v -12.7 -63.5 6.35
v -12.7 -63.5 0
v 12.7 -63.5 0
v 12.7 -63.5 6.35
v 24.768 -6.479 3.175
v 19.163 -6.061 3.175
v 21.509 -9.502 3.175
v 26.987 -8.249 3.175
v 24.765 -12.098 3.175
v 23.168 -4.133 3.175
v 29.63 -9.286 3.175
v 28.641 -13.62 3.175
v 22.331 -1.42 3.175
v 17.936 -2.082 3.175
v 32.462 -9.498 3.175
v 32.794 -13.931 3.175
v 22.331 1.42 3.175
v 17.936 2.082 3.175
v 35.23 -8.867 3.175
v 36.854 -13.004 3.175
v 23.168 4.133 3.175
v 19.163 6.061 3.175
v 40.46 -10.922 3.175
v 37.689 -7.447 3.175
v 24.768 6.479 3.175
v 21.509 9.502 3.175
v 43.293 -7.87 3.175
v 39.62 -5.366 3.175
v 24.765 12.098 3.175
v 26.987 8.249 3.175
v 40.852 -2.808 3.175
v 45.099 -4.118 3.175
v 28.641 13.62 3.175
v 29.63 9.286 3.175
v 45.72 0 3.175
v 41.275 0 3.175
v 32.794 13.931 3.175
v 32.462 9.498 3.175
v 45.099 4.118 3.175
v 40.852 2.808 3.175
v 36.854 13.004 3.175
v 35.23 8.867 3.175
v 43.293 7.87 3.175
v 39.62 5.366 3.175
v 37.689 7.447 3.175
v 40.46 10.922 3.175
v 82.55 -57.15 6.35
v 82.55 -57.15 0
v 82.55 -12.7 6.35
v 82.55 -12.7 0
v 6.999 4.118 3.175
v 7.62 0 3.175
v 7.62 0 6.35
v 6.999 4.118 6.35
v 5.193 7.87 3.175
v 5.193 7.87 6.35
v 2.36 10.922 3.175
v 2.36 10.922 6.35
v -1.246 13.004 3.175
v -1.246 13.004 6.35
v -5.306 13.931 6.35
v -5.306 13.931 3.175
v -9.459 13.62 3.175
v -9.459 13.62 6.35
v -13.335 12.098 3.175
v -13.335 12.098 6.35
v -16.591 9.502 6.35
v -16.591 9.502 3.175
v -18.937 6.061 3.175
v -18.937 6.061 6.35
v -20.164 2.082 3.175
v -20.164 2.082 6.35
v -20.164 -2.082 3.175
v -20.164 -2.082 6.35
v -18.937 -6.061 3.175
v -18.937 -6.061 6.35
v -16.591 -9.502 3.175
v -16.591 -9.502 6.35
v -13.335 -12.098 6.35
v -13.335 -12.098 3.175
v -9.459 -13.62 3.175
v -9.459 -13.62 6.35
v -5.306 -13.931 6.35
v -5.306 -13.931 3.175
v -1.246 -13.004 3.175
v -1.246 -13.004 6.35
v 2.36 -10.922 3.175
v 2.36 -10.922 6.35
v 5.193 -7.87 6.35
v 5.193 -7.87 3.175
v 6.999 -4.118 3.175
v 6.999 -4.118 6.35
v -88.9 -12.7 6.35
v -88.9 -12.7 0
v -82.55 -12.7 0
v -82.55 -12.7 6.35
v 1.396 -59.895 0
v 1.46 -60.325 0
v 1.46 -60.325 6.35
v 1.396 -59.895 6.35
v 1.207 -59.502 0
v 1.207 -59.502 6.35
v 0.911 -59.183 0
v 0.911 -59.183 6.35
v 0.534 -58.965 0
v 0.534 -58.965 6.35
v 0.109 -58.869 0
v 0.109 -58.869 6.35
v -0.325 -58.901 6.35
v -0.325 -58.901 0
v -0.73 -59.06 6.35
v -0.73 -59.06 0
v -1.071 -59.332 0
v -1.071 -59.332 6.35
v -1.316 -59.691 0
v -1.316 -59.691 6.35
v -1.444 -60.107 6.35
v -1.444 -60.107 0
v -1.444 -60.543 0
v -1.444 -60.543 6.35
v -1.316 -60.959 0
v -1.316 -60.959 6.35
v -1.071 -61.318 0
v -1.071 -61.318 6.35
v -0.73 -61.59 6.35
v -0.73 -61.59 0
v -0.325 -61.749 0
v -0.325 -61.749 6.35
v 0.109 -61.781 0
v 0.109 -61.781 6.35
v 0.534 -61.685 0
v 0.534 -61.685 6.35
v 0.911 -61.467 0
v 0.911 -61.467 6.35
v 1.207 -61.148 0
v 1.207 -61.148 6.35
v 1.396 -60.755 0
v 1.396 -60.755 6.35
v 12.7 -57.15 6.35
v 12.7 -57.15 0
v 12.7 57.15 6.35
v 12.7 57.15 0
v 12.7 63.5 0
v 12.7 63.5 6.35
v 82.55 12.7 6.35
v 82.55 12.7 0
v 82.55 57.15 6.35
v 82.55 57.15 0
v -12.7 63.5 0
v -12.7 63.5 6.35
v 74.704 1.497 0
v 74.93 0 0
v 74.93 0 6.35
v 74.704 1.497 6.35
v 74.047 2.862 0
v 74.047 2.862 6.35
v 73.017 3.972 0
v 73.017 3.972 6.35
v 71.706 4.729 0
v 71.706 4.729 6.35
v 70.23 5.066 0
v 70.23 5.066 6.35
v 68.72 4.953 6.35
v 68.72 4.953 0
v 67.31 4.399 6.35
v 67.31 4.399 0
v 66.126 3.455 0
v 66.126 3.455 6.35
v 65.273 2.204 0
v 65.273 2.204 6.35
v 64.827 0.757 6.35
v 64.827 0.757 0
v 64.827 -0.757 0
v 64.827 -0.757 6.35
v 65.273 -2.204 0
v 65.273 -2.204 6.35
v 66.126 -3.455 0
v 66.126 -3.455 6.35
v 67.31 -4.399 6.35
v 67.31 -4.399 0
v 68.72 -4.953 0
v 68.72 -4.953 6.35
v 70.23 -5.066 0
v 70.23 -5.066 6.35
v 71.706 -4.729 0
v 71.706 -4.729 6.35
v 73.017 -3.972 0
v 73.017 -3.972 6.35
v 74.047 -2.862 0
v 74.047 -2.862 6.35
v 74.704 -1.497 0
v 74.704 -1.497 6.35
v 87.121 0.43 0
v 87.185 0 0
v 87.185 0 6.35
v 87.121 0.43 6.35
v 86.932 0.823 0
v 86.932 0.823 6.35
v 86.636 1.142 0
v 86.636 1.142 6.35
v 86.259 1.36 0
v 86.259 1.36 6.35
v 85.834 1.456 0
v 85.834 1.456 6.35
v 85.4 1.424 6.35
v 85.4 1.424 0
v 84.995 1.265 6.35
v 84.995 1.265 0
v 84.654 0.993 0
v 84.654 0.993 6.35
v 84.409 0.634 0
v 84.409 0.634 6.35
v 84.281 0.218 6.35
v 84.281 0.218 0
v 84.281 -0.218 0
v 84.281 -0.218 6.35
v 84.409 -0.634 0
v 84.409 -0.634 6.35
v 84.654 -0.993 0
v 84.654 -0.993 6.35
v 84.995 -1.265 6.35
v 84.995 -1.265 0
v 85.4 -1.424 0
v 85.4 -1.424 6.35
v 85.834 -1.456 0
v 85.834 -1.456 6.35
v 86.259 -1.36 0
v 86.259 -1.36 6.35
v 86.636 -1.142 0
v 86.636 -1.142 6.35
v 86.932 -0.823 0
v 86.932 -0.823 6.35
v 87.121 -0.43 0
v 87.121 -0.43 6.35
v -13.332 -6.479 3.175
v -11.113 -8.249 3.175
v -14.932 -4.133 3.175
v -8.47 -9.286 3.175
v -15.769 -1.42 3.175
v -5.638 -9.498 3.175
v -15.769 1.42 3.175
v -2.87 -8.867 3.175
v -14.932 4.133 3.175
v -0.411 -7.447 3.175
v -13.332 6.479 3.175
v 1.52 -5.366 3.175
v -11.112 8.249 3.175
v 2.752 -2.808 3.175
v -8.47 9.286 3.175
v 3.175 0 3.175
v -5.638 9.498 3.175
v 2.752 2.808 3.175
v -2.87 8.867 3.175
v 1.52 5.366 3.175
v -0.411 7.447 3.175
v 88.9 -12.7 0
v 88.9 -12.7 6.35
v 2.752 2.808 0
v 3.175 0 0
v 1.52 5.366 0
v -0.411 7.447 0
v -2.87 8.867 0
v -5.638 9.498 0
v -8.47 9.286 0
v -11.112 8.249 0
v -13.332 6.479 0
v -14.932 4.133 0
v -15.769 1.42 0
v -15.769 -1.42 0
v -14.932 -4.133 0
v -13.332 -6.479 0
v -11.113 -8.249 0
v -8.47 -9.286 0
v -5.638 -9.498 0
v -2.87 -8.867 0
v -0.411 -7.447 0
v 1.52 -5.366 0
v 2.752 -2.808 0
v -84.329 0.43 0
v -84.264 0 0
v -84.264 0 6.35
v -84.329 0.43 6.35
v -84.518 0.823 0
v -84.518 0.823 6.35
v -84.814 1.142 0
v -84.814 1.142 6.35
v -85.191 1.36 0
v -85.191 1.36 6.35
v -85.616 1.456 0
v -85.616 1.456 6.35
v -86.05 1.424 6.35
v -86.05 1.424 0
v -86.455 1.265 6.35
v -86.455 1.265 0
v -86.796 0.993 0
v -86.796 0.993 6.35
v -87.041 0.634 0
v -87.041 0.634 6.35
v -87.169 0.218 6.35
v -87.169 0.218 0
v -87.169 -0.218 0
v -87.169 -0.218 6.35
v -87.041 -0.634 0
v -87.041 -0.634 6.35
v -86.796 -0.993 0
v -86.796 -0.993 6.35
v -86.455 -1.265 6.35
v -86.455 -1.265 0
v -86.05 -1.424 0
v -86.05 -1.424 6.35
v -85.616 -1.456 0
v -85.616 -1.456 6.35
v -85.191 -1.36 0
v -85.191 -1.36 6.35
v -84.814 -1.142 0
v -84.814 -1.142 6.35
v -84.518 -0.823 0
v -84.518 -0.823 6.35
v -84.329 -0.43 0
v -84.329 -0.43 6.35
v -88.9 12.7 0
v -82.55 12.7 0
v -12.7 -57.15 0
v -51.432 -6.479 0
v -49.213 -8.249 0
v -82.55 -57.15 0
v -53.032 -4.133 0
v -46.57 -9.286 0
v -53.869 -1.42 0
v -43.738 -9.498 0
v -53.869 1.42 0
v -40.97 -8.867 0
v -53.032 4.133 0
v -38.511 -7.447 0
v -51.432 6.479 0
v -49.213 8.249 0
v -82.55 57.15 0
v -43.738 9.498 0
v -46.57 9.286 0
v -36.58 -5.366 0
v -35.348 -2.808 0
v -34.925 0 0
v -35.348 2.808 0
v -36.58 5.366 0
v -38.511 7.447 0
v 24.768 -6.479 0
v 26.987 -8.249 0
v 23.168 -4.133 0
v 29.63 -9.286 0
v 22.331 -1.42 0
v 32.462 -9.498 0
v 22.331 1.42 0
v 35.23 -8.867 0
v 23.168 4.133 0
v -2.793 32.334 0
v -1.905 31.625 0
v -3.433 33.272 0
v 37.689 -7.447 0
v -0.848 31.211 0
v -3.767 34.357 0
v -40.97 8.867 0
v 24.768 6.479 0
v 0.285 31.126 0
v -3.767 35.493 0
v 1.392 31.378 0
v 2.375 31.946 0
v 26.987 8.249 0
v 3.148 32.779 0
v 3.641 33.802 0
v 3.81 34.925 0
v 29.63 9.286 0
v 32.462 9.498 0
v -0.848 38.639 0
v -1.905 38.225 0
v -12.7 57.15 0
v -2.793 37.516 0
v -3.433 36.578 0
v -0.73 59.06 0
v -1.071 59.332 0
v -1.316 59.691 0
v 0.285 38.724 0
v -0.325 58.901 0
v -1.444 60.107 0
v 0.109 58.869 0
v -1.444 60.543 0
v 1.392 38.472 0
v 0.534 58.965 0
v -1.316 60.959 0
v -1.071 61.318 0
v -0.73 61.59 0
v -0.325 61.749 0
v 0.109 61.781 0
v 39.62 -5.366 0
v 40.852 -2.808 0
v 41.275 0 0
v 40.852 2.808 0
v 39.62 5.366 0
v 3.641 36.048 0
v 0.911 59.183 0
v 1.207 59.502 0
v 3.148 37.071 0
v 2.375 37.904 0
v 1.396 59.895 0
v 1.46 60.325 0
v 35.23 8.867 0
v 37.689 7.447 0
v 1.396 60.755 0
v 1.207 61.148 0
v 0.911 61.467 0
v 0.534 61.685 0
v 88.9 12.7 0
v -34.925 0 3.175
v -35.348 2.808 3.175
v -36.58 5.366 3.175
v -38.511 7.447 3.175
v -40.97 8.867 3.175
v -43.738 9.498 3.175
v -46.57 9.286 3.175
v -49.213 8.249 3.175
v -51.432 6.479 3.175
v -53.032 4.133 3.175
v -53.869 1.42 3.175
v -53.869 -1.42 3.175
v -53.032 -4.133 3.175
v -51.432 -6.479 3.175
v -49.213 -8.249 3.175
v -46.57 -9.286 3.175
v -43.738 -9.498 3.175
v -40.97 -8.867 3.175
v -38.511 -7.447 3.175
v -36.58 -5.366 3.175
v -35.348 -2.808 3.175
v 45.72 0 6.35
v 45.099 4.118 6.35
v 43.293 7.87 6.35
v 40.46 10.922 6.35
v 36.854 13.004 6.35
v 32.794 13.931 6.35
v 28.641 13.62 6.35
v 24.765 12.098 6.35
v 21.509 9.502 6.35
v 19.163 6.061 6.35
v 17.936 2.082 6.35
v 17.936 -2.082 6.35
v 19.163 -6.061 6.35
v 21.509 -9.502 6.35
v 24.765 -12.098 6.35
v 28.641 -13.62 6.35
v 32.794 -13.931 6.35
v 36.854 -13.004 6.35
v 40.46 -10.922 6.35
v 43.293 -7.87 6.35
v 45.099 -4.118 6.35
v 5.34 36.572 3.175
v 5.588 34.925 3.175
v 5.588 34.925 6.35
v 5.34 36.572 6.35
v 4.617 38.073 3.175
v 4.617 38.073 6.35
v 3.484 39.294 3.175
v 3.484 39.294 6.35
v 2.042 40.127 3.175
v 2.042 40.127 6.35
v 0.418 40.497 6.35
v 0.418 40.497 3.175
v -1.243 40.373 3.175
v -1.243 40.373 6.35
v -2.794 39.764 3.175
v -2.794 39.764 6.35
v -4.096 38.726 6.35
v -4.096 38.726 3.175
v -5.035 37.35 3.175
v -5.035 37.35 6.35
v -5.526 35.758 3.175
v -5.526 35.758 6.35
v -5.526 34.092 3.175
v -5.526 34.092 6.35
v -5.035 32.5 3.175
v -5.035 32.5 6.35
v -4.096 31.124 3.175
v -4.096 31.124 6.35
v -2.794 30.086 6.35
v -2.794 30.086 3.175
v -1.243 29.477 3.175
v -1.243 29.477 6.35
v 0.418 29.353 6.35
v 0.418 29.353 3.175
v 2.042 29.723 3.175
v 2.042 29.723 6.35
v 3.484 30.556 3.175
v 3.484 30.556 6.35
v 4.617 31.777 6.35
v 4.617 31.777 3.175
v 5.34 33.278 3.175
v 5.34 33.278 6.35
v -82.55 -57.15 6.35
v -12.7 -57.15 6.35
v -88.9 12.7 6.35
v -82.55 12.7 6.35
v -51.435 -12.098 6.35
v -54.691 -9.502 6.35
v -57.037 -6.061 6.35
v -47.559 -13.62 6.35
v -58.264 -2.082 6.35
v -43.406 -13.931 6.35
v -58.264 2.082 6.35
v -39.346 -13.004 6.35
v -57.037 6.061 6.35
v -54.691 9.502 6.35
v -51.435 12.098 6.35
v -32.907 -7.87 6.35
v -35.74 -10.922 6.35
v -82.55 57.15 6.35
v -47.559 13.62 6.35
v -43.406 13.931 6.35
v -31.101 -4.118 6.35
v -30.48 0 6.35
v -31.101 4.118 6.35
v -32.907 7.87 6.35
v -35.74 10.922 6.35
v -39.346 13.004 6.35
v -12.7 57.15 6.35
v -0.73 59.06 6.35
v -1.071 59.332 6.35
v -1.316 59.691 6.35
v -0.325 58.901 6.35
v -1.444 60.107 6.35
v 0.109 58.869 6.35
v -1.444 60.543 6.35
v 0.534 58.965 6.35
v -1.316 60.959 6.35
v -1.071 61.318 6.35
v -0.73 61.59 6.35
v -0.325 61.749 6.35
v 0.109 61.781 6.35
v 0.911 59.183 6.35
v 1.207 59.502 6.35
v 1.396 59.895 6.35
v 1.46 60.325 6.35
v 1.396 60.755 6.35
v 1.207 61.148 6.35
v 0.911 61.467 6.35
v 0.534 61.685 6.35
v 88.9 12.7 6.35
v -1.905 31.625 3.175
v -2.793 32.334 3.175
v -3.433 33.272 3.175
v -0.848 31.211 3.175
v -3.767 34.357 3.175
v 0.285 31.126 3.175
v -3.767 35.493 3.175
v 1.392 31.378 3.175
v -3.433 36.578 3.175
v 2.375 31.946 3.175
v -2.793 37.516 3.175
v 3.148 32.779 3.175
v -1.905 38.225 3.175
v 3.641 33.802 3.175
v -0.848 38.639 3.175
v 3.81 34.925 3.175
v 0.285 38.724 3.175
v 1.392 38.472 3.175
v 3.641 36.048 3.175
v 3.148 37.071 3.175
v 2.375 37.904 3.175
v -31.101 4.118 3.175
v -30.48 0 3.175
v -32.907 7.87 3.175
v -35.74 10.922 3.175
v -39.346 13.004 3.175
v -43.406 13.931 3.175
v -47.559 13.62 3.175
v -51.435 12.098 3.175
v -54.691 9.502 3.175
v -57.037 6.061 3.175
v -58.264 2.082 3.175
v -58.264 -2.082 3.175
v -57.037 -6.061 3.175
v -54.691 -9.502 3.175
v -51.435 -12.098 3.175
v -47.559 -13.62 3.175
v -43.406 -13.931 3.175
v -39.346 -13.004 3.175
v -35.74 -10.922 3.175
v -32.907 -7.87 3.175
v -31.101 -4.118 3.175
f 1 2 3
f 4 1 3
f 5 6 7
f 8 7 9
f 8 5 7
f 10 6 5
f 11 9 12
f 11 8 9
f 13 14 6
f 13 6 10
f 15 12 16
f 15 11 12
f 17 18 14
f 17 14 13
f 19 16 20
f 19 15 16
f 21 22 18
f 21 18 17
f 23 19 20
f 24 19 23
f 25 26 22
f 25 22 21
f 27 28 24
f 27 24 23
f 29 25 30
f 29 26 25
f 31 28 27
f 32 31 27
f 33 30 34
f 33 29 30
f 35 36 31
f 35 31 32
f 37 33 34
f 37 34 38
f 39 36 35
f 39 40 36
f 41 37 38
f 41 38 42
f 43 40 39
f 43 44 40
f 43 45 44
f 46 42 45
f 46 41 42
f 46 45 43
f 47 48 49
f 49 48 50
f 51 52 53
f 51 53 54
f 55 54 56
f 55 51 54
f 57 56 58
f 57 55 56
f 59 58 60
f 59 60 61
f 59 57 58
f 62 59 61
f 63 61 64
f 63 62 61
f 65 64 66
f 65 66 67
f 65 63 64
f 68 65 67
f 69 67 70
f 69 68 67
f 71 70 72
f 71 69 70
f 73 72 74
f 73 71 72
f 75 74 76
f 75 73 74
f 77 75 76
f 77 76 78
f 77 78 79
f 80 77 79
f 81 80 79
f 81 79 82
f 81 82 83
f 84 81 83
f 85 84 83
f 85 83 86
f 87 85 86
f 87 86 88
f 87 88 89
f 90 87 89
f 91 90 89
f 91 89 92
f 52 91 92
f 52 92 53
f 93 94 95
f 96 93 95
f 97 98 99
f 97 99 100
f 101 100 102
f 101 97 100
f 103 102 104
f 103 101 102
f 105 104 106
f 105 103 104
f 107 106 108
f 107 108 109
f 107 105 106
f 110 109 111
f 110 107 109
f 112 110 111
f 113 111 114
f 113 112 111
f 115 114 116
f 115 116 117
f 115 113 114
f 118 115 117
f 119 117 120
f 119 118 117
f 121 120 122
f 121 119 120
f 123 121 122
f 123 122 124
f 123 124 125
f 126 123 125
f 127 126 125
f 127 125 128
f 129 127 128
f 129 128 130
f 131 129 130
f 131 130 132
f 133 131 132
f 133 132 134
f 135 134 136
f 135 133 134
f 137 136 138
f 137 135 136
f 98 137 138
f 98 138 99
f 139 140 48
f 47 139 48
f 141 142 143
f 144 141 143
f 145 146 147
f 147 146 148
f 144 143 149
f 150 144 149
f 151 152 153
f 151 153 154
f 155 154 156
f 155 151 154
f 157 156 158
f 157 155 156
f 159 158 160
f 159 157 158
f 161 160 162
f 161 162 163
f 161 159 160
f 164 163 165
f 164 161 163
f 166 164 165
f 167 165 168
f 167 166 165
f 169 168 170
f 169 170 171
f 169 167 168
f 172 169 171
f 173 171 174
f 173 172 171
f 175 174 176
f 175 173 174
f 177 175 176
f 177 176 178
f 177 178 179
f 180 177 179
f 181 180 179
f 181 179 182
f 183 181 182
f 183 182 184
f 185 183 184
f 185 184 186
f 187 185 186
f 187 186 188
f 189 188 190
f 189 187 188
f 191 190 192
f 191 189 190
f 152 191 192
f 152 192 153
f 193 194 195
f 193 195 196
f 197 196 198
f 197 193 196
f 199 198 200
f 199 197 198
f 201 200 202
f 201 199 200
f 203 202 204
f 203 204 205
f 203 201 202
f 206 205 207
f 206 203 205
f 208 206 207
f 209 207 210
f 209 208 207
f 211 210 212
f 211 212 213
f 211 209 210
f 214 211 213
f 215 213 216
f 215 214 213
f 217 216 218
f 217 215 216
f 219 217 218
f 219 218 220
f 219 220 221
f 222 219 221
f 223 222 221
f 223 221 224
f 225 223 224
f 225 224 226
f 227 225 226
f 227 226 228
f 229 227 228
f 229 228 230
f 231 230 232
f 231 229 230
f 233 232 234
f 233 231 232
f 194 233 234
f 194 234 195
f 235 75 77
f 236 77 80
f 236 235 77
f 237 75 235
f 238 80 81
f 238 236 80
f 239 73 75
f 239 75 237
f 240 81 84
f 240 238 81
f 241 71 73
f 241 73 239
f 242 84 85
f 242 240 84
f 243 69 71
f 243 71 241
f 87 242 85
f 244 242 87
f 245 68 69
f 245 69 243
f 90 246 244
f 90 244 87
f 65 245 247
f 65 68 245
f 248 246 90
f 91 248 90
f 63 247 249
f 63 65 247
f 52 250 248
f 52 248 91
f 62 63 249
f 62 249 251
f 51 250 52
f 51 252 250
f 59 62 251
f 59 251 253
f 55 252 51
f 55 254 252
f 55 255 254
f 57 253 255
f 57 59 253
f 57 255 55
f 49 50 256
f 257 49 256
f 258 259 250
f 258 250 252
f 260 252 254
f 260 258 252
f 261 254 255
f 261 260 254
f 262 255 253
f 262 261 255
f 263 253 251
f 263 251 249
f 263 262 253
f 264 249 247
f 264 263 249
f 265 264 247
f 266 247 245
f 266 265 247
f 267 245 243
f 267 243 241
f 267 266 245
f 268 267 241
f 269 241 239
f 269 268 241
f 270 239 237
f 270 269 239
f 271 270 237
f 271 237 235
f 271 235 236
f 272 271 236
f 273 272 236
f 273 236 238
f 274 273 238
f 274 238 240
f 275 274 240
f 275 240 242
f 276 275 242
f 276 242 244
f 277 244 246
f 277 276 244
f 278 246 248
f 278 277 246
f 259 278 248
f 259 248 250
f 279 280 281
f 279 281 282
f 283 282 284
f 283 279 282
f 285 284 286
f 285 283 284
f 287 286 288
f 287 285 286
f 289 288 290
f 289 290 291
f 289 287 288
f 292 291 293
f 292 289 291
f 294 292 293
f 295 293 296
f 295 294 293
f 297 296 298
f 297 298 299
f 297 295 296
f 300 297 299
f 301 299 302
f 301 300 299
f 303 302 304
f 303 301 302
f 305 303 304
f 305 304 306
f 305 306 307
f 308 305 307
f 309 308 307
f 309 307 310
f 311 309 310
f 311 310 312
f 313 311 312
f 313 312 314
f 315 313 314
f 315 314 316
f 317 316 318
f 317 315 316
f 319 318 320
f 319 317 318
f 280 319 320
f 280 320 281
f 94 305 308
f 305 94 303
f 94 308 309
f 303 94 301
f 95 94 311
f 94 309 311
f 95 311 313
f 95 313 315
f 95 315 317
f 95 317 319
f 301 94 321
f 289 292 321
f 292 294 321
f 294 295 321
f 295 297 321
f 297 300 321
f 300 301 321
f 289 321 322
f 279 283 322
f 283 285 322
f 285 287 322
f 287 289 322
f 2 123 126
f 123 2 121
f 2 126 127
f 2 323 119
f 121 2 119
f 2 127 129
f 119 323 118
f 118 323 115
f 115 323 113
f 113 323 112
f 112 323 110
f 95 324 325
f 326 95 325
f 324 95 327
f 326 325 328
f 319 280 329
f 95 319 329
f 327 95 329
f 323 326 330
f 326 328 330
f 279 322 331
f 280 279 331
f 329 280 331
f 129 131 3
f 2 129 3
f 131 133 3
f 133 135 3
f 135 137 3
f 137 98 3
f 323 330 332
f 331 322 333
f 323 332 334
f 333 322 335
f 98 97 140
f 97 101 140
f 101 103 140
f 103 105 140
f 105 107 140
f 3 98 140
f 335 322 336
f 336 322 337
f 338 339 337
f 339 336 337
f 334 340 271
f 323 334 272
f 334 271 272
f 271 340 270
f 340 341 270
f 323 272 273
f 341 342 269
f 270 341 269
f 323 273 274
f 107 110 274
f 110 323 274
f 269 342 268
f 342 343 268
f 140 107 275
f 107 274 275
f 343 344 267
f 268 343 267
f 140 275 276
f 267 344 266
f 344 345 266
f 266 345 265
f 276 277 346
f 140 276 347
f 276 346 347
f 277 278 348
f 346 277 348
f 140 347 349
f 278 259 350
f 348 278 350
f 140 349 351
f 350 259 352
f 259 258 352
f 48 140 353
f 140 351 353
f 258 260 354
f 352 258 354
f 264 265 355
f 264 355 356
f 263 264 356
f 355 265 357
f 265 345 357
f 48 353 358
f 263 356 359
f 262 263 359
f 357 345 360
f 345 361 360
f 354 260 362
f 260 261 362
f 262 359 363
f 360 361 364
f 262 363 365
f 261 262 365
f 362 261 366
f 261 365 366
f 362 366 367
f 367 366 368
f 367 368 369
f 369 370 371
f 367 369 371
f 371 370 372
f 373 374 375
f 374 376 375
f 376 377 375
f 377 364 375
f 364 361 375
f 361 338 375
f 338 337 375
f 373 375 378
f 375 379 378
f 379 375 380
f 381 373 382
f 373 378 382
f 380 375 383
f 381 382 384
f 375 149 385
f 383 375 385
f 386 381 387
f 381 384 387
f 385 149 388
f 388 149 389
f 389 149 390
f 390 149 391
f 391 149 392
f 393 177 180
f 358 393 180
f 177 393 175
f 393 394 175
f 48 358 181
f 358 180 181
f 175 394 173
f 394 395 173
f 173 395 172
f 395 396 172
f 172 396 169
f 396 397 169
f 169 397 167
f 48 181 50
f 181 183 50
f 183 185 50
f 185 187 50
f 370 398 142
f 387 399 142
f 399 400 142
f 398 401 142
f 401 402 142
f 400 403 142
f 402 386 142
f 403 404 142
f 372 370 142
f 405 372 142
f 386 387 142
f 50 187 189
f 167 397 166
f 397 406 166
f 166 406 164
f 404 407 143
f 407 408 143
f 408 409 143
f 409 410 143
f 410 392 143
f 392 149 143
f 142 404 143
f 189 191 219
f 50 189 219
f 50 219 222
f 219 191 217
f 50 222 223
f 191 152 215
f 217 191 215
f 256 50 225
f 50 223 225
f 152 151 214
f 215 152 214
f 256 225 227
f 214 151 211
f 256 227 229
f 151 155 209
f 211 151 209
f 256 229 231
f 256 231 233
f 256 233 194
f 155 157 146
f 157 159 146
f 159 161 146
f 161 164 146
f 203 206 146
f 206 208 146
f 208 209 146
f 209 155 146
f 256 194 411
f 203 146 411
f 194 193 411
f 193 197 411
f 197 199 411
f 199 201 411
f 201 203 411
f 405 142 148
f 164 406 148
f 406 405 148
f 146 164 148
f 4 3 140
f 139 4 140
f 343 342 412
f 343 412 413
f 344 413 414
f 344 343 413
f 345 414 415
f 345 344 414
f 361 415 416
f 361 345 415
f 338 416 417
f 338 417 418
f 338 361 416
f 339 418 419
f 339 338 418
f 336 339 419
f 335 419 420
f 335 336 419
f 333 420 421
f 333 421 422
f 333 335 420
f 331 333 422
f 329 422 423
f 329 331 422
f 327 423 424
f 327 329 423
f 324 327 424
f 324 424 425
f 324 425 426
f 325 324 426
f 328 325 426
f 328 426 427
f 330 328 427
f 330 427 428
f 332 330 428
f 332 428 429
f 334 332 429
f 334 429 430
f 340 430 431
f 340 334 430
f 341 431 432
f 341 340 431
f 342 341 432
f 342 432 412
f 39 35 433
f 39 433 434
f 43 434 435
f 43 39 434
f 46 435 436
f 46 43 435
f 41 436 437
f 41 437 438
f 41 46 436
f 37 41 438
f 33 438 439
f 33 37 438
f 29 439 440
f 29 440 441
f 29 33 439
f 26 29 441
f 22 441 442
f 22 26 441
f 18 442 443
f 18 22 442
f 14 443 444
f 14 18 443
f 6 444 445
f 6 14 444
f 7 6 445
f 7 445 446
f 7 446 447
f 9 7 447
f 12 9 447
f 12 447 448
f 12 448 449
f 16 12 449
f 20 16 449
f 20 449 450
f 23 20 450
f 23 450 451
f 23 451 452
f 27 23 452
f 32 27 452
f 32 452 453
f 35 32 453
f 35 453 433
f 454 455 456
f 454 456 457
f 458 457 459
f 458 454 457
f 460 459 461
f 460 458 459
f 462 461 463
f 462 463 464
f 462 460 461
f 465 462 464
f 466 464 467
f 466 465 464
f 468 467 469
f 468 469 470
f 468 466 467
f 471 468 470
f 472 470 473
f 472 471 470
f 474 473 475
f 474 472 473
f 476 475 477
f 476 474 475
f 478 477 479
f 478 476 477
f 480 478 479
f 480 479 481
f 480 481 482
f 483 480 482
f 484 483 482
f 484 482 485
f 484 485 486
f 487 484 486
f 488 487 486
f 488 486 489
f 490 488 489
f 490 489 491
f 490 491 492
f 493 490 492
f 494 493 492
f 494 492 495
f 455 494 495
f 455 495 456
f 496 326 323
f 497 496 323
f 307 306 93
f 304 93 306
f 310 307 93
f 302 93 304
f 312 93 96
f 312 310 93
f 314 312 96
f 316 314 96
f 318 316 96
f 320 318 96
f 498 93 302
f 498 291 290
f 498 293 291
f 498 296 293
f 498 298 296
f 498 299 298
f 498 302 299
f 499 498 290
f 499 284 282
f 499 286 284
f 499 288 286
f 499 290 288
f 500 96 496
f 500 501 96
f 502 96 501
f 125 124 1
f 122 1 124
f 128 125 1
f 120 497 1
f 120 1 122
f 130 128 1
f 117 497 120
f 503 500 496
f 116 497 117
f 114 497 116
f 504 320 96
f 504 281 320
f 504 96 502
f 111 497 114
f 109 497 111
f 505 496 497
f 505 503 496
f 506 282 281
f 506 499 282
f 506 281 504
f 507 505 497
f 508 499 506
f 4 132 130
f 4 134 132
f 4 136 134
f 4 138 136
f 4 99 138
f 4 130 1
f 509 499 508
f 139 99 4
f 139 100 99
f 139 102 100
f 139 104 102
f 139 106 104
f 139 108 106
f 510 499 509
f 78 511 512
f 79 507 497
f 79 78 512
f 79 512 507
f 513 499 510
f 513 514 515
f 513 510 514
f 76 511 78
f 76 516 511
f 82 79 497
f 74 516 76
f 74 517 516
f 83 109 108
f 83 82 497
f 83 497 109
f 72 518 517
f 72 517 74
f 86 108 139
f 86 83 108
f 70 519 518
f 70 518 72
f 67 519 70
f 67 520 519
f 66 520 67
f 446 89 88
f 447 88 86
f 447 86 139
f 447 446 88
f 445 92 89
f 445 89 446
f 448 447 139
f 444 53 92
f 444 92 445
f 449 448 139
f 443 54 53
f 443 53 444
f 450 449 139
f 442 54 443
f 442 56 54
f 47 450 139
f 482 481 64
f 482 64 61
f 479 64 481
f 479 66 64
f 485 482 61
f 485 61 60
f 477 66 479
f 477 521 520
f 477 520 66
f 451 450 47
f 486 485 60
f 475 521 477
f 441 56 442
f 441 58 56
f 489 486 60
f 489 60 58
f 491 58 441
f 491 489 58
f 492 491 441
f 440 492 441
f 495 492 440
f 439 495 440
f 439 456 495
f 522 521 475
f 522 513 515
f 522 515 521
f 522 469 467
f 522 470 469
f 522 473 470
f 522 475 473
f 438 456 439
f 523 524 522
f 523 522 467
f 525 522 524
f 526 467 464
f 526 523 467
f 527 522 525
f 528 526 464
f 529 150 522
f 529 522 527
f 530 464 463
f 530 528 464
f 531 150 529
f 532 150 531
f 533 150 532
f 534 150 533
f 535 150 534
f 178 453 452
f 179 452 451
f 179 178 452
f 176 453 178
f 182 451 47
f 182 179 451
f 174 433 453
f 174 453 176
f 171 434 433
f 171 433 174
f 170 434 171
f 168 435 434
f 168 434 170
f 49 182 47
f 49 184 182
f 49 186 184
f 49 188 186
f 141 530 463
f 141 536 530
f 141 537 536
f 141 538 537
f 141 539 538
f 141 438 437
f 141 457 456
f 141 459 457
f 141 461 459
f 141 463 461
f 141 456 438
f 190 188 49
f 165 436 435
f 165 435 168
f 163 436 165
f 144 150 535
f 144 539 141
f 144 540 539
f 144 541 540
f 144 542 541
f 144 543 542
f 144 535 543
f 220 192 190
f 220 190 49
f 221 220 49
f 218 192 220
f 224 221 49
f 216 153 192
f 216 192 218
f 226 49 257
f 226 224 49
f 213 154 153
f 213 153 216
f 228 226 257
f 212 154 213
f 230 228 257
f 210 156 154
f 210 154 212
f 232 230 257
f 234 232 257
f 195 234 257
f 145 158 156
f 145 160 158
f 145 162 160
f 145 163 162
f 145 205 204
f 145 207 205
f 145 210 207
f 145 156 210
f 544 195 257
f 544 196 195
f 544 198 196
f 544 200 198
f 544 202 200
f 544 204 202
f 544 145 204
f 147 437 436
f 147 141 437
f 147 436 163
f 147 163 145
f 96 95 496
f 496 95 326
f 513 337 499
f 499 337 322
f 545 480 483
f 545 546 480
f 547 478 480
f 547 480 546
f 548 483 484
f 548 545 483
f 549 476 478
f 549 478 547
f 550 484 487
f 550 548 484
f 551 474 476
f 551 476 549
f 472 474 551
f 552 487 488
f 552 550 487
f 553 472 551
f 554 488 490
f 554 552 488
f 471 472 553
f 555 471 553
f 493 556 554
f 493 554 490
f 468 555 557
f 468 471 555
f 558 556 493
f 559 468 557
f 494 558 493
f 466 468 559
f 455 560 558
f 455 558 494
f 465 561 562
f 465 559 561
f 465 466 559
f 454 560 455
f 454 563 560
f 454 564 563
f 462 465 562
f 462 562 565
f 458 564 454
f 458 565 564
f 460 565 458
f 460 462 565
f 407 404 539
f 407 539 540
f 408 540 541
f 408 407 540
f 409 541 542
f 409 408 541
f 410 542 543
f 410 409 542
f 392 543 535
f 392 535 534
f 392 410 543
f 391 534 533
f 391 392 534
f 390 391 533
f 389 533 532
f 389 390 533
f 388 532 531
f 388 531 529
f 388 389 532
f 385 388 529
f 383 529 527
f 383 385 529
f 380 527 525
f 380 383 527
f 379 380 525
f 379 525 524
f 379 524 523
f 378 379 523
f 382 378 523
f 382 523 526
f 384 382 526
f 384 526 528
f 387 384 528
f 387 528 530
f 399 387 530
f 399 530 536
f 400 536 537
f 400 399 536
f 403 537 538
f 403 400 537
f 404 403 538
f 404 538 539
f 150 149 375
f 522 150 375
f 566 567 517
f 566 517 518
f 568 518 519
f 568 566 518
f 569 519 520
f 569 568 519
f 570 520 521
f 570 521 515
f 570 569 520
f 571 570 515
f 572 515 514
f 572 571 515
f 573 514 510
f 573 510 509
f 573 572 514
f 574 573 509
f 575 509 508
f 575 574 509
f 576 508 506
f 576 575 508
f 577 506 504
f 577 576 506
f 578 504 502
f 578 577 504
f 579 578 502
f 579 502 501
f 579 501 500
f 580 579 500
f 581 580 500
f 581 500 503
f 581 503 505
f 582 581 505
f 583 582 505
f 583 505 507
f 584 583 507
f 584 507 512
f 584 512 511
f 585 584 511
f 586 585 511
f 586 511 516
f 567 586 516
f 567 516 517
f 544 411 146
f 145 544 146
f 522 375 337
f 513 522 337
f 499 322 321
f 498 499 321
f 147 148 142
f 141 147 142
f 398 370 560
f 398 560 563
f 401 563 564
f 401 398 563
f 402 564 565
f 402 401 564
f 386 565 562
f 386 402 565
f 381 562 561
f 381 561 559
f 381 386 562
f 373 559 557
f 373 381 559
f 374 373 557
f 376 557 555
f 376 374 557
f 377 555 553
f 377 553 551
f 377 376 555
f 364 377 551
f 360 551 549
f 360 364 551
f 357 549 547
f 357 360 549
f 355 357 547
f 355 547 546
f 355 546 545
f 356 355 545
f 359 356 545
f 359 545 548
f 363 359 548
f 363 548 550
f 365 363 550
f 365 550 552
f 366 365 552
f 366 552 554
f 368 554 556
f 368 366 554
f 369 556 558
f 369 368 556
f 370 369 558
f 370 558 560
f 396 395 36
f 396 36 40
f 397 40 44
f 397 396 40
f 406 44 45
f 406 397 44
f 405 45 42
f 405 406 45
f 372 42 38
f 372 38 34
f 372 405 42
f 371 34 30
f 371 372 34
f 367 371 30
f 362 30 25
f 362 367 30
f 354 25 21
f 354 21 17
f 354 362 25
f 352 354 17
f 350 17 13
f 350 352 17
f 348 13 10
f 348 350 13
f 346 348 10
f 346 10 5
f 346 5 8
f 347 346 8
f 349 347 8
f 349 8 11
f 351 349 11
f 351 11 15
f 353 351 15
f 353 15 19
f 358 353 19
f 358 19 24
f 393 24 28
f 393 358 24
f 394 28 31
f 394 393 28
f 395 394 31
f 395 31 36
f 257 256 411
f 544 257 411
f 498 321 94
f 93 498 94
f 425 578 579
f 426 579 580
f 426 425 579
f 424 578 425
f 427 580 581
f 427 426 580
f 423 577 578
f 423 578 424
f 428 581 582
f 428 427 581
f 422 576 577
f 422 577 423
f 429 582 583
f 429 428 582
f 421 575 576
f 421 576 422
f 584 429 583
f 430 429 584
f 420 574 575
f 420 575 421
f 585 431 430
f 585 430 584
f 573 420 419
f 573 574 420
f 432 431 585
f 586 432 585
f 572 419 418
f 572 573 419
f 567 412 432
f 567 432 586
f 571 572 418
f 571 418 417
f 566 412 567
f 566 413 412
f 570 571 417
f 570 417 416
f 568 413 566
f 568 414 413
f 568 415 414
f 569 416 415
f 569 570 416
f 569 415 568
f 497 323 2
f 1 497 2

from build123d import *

# Parameters (mm, degrees)
F0_R     = 1.4605
F0_R_2   = 13.97
F0_R_3   = 5.08
F0_R_4   = 5.588
F1_DEPTH = 6.35
F0_R_5   = 9.525
F2_DEPTH = 3.175
F0_R_6   = 3.81
F3_DEPTH = 3.175


with BuildPart() as f1:
    # F0 (on Top) → F1 (new body)
    with BuildSketch(Plane.XY):
        Polygon((-12.7, -63.5), (12.7, -63.5), (12.7, -57.149999), (82.549999, -57.149999), (82.549999, -12.7), (88.9, -12.7), (88.9, 12.7), (82.549999, 12.7), (82.549999, 57.149999), (12.7, 57.149999), (12.7, 63.5), (-12.7, 63.5), (-12.7, 57.149999), (-82.549999, 57.149999), (-82.549999, 12.7), (-88.9, 12.7), (-88.9, -12.7), (-82.549999, -12.7), (-82.549999, -57.149999), (-12.7, -57.149999), align=None)
        with Locations((0, -60.324999)):
            Circle(F0_R, mode=Mode.SUBTRACT)
        with Locations((-85.724999, 0)):
            Circle(F0_R, mode=Mode.SUBTRACT)
        with Locations((-44.45, 0)):
            Circle(F0_R_2, mode=Mode.SUBTRACT)
        with Locations((-6.35, 0)):
            Circle(F0_R_2, mode=Mode.SUBTRACT)
        with Locations((31.75, 0)):
            Circle(F0_R_2, mode=Mode.SUBTRACT)
        with Locations((69.849998, 0)):
            Circle(F0_R_3, mode=Mode.SUBTRACT)
        with Locations((85.724999, 0)):
            Circle(F0_R, mode=Mode.SUBTRACT)
        with Locations((0, 34.924999)):
            Circle(F0_R_4, mode=Mode.SUBTRACT)
        with Locations((0, 60.324999)):
            Circle(F0_R, mode=Mode.SUBTRACT)
    extrude(amount=F1_DEPTH)

    # F0 (on Top) → F2 (join)
    with BuildSketch(Plane.XY):
        with Locations((-44.45, 0)):
            Circle(F0_R_2)
        with Locations((-44.45, 0)):
            Circle(F0_R_5, mode=Mode.SUBTRACT)
        with Locations((-6.35, 0)):
            Circle(F0_R_2)
        with Locations((-6.35, 0)):
            Circle(F0_R_5, mode=Mode.SUBTRACT)
        with Locations((31.75, 0)):
            Circle(F0_R_2)
        with Locations((31.75, 0)):
            Circle(F0_R_5, mode=Mode.SUBTRACT)
    extrude(amount=F2_DEPTH)

    # F0 (on Top) → F3 (join)
    with BuildSketch(Plane.XY):
        with Locations((0, 34.924999)):
            Circle(F0_R_4)
        with Locations((0, 34.924999)):
            Circle(F0_R_6, mode=Mode.SUBTRACT)
    extrude(amount=F3_DEPTH)


solid = f1.part
